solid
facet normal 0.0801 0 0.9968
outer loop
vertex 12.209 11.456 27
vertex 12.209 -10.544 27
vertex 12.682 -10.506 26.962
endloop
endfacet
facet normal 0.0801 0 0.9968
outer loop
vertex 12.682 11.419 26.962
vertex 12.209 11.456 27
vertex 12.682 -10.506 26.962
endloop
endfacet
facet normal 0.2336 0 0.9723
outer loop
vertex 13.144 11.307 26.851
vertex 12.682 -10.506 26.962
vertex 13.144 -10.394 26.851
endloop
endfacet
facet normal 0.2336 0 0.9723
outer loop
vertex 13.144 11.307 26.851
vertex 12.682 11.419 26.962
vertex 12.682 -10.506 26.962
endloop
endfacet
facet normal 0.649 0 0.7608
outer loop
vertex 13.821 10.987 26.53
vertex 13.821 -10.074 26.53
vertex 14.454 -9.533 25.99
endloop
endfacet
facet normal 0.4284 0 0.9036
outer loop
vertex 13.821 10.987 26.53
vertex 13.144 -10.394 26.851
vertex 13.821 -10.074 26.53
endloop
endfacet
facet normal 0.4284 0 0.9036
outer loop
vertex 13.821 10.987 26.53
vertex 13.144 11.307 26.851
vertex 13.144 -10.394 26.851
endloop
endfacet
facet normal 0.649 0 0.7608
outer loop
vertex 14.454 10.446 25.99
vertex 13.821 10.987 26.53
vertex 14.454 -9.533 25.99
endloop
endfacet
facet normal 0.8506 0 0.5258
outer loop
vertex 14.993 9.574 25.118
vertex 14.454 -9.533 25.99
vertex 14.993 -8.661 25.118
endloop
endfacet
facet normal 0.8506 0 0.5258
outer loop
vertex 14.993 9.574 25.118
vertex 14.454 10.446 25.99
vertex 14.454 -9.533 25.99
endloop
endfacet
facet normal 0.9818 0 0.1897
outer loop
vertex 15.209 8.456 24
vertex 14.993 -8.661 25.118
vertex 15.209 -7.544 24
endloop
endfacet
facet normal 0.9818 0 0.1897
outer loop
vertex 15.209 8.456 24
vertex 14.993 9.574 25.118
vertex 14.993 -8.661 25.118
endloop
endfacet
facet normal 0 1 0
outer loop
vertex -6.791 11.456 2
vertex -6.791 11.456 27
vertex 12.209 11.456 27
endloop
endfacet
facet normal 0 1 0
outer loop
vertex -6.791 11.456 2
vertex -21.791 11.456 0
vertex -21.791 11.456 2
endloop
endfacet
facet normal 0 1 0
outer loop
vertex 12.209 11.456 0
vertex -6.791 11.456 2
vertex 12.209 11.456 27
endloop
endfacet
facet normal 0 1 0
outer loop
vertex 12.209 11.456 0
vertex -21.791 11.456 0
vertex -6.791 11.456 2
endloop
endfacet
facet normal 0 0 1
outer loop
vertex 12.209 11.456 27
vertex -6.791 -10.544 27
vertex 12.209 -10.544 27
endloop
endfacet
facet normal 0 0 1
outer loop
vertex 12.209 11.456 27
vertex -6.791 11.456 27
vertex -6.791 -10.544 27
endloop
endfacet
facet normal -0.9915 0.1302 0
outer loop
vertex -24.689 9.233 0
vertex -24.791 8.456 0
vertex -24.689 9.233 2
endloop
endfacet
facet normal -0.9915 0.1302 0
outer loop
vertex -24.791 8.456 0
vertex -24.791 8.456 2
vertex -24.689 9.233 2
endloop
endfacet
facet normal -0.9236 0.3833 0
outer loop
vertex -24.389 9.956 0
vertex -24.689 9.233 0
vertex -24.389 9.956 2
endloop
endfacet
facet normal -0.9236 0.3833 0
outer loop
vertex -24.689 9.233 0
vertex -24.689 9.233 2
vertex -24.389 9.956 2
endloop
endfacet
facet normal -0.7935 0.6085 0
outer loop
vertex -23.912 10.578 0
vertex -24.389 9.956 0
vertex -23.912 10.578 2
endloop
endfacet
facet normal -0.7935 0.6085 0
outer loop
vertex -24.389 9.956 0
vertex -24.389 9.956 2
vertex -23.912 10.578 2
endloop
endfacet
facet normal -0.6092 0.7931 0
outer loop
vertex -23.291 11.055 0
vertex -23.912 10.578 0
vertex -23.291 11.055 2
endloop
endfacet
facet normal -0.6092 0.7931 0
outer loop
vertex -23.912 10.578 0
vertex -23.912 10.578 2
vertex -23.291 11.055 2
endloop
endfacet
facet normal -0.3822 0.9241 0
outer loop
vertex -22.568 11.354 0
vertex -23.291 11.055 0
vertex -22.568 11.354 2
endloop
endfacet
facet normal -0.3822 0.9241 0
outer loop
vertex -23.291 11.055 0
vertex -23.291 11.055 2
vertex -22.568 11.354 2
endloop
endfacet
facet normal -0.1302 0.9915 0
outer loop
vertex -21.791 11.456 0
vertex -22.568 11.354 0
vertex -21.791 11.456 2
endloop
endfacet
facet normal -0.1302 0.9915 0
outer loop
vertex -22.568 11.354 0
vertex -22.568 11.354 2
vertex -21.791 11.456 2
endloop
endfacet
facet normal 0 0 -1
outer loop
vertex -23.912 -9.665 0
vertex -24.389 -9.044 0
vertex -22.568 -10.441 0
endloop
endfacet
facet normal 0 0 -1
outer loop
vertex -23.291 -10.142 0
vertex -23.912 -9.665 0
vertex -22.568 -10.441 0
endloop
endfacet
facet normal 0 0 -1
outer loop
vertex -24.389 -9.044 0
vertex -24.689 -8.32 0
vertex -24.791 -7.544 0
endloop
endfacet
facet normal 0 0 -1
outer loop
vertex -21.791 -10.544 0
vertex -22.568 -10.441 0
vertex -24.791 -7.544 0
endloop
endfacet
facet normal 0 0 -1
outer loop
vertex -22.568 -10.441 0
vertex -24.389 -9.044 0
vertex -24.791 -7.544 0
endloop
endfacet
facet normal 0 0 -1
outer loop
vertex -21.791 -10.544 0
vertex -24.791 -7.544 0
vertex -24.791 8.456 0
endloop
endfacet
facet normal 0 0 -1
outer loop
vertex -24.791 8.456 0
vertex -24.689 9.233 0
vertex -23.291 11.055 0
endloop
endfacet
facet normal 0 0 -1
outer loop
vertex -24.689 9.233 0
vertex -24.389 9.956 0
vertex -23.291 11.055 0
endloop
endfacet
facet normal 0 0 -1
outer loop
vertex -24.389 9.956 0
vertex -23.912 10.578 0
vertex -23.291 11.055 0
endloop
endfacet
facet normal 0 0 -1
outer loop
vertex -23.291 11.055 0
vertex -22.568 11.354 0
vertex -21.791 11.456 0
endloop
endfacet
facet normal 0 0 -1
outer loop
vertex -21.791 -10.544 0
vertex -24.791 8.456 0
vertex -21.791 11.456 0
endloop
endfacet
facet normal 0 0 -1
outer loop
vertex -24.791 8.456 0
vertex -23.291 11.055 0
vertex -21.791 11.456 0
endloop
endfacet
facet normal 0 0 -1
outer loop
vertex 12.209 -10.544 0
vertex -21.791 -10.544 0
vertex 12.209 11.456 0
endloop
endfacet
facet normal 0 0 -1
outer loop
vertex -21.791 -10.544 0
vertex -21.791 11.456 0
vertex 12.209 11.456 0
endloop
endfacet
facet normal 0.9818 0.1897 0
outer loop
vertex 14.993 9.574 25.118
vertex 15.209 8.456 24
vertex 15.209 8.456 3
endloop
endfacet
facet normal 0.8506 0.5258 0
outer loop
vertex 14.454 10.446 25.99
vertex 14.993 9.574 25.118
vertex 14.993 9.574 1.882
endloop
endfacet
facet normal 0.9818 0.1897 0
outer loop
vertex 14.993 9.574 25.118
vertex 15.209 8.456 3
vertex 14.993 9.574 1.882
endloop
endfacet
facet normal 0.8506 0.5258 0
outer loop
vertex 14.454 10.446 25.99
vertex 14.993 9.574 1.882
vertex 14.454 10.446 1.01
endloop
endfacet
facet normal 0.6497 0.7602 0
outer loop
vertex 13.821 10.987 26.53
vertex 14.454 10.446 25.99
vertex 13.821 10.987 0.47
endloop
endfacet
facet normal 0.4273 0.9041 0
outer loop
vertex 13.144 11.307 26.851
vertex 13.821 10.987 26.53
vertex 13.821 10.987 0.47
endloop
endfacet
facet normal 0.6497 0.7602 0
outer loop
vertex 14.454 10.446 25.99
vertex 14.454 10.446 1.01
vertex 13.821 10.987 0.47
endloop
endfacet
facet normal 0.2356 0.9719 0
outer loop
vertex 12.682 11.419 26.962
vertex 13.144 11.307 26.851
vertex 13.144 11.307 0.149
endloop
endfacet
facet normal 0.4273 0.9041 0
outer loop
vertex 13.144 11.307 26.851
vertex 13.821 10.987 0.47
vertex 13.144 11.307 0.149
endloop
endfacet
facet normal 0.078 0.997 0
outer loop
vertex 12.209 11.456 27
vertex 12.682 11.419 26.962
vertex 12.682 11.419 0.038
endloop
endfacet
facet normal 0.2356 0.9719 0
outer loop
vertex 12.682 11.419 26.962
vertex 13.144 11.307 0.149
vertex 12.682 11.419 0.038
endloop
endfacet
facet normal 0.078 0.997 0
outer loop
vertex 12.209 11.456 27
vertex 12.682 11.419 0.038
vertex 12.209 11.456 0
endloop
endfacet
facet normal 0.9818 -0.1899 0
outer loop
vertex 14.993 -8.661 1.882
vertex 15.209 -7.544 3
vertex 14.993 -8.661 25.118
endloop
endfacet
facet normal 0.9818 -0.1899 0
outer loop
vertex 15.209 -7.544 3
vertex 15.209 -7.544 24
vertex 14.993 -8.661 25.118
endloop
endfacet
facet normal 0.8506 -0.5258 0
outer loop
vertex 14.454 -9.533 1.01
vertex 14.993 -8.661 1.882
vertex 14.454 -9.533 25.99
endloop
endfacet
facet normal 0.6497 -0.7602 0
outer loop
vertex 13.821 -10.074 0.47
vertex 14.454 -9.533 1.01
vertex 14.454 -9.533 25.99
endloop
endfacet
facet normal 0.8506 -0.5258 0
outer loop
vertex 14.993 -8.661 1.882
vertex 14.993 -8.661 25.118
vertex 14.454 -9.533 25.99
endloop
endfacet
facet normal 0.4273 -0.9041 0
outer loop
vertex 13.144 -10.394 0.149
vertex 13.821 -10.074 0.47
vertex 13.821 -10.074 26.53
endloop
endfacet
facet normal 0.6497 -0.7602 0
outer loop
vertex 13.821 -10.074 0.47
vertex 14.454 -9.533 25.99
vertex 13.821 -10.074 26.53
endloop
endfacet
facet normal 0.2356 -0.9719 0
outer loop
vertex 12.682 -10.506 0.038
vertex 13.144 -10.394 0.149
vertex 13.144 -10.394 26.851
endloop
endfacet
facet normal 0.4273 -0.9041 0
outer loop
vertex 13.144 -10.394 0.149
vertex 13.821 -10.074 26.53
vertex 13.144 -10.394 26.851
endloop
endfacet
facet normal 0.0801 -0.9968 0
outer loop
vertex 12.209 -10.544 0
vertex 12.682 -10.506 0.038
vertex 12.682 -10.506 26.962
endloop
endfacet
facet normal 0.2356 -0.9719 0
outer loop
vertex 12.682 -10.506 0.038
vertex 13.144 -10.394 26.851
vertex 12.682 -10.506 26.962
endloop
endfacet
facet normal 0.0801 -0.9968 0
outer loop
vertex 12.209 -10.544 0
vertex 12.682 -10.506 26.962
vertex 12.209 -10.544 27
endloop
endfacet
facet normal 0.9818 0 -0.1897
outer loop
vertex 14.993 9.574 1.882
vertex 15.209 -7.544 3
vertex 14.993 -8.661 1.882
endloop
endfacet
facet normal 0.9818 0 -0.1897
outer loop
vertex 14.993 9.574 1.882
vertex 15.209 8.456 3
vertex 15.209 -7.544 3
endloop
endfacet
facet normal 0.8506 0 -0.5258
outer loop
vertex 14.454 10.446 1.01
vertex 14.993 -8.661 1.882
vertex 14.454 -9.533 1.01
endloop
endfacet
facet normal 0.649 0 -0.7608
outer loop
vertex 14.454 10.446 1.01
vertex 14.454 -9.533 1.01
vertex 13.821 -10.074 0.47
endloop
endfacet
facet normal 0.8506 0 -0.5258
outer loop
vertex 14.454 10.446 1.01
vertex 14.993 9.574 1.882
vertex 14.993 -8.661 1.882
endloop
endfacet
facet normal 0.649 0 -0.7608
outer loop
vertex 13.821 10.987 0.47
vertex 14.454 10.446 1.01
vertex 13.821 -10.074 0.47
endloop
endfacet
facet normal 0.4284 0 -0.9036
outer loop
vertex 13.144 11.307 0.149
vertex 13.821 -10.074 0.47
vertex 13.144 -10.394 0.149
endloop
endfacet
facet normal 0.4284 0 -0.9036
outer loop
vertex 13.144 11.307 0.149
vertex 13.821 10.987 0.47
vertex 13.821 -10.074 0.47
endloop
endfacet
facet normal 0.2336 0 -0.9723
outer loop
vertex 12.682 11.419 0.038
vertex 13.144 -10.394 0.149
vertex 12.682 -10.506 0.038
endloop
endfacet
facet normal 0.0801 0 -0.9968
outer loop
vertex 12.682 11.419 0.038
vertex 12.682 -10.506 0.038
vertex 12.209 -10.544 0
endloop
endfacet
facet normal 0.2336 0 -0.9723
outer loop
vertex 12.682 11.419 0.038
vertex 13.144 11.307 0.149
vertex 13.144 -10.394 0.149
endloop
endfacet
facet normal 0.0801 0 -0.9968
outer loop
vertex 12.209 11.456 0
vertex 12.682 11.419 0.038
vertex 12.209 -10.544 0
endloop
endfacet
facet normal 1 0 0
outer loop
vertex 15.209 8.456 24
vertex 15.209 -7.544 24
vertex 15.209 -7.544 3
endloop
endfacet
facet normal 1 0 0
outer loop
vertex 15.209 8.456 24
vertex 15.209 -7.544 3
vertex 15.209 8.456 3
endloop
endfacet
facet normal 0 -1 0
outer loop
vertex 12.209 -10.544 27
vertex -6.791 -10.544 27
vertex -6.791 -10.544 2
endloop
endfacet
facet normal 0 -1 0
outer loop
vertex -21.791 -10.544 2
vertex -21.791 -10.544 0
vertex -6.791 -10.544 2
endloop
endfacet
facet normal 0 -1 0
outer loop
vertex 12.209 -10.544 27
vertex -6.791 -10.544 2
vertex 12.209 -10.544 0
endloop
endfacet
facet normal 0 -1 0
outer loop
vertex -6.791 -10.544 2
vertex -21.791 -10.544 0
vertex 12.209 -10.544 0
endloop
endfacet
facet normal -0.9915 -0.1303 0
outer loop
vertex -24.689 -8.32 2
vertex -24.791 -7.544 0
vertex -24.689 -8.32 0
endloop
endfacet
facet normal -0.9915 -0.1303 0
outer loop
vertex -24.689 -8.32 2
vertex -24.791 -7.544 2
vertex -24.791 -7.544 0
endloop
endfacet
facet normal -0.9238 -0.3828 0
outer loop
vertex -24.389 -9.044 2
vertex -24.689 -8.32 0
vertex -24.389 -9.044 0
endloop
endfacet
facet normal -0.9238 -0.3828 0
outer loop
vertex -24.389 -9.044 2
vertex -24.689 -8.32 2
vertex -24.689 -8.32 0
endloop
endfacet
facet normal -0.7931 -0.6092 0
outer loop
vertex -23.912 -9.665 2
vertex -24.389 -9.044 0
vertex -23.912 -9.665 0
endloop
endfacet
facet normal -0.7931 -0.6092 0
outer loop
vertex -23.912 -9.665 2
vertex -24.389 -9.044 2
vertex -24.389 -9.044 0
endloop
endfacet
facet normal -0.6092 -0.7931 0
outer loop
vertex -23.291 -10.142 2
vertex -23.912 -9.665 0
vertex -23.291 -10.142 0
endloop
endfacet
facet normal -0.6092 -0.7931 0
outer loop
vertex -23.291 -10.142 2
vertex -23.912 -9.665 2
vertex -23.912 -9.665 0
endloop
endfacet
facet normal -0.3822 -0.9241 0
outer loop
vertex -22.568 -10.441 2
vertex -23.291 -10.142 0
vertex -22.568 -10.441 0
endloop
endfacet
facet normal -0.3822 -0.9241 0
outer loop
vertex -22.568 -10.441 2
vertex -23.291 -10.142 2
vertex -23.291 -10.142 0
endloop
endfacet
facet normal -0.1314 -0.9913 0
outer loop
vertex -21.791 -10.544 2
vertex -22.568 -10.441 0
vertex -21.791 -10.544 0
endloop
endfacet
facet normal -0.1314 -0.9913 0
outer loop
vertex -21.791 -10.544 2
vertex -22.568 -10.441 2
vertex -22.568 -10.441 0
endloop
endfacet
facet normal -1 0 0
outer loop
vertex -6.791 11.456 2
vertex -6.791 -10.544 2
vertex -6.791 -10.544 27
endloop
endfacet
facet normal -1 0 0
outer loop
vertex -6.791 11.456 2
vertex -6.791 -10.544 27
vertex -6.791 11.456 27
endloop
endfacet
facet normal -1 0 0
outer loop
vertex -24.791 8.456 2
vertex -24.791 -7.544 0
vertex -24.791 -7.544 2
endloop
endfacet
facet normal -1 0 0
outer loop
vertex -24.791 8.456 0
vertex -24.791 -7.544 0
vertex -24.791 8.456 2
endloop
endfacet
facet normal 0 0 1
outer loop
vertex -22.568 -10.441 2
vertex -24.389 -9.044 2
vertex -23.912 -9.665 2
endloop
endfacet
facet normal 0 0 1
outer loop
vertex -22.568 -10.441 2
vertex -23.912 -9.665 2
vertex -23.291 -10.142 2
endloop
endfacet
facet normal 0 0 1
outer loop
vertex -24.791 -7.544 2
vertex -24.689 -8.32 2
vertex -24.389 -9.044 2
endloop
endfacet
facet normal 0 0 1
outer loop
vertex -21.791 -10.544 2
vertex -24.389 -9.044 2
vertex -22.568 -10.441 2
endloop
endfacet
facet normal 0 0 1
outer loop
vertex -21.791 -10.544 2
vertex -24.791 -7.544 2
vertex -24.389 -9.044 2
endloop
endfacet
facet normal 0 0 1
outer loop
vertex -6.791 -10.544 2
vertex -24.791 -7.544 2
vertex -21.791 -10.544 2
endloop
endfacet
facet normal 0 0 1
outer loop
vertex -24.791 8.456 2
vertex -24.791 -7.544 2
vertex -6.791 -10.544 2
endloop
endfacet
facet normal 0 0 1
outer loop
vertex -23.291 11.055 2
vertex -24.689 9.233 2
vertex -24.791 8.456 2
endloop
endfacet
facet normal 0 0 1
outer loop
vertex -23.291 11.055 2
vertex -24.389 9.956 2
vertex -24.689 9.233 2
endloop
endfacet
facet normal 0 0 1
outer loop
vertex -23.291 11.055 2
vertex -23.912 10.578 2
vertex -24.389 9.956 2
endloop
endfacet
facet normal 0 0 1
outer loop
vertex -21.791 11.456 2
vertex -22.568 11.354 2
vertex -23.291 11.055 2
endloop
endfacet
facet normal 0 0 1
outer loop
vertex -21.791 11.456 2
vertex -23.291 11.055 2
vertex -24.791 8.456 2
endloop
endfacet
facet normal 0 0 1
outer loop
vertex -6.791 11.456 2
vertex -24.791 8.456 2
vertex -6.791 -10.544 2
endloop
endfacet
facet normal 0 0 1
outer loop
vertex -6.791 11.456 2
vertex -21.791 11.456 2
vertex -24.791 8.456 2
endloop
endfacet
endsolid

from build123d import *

# Parameters (mm, degrees)
F0_W     = 40
F0_H     = 22
F1_DEPTH = 2
F2_W     = 22
F2_H     = 22
F3_DEPTH = 25
F4_R     = 3


with BuildPart() as f1:
    # F0 (on Top) → F1 (new body)
    with BuildSketch(Plane.XY):
        with Locations((-4.791172, 0.456456)):
            Rectangle(F0_W, F0_H)
    extrude(amount=F1_DEPTH)

    # F2 (on face) → F3 (join)
    with BuildSketch(Plane.XY.offset(2)):
        with Locations((4.208828, 0.456456)):
            Rectangle(F2_W, F2_H)
    extrude(amount=F3_DEPTH)

    # F4
    f4_edges = [f1.edges().sort_by_distance(p)[0] for p in [
        (-24.791172, 11.456456, 1),
        (-24.791172, -10.543544, 1),
        (15.208828, -10.543544, 13.5),
        (15.208828, 0.456456, 0),
        (15.208828, 11.456456, 13.5),
        (15.208828, 0.456456, 27),
    ]]
    fillet(f4_edges, radius=F4_R)


solid = f1.part
